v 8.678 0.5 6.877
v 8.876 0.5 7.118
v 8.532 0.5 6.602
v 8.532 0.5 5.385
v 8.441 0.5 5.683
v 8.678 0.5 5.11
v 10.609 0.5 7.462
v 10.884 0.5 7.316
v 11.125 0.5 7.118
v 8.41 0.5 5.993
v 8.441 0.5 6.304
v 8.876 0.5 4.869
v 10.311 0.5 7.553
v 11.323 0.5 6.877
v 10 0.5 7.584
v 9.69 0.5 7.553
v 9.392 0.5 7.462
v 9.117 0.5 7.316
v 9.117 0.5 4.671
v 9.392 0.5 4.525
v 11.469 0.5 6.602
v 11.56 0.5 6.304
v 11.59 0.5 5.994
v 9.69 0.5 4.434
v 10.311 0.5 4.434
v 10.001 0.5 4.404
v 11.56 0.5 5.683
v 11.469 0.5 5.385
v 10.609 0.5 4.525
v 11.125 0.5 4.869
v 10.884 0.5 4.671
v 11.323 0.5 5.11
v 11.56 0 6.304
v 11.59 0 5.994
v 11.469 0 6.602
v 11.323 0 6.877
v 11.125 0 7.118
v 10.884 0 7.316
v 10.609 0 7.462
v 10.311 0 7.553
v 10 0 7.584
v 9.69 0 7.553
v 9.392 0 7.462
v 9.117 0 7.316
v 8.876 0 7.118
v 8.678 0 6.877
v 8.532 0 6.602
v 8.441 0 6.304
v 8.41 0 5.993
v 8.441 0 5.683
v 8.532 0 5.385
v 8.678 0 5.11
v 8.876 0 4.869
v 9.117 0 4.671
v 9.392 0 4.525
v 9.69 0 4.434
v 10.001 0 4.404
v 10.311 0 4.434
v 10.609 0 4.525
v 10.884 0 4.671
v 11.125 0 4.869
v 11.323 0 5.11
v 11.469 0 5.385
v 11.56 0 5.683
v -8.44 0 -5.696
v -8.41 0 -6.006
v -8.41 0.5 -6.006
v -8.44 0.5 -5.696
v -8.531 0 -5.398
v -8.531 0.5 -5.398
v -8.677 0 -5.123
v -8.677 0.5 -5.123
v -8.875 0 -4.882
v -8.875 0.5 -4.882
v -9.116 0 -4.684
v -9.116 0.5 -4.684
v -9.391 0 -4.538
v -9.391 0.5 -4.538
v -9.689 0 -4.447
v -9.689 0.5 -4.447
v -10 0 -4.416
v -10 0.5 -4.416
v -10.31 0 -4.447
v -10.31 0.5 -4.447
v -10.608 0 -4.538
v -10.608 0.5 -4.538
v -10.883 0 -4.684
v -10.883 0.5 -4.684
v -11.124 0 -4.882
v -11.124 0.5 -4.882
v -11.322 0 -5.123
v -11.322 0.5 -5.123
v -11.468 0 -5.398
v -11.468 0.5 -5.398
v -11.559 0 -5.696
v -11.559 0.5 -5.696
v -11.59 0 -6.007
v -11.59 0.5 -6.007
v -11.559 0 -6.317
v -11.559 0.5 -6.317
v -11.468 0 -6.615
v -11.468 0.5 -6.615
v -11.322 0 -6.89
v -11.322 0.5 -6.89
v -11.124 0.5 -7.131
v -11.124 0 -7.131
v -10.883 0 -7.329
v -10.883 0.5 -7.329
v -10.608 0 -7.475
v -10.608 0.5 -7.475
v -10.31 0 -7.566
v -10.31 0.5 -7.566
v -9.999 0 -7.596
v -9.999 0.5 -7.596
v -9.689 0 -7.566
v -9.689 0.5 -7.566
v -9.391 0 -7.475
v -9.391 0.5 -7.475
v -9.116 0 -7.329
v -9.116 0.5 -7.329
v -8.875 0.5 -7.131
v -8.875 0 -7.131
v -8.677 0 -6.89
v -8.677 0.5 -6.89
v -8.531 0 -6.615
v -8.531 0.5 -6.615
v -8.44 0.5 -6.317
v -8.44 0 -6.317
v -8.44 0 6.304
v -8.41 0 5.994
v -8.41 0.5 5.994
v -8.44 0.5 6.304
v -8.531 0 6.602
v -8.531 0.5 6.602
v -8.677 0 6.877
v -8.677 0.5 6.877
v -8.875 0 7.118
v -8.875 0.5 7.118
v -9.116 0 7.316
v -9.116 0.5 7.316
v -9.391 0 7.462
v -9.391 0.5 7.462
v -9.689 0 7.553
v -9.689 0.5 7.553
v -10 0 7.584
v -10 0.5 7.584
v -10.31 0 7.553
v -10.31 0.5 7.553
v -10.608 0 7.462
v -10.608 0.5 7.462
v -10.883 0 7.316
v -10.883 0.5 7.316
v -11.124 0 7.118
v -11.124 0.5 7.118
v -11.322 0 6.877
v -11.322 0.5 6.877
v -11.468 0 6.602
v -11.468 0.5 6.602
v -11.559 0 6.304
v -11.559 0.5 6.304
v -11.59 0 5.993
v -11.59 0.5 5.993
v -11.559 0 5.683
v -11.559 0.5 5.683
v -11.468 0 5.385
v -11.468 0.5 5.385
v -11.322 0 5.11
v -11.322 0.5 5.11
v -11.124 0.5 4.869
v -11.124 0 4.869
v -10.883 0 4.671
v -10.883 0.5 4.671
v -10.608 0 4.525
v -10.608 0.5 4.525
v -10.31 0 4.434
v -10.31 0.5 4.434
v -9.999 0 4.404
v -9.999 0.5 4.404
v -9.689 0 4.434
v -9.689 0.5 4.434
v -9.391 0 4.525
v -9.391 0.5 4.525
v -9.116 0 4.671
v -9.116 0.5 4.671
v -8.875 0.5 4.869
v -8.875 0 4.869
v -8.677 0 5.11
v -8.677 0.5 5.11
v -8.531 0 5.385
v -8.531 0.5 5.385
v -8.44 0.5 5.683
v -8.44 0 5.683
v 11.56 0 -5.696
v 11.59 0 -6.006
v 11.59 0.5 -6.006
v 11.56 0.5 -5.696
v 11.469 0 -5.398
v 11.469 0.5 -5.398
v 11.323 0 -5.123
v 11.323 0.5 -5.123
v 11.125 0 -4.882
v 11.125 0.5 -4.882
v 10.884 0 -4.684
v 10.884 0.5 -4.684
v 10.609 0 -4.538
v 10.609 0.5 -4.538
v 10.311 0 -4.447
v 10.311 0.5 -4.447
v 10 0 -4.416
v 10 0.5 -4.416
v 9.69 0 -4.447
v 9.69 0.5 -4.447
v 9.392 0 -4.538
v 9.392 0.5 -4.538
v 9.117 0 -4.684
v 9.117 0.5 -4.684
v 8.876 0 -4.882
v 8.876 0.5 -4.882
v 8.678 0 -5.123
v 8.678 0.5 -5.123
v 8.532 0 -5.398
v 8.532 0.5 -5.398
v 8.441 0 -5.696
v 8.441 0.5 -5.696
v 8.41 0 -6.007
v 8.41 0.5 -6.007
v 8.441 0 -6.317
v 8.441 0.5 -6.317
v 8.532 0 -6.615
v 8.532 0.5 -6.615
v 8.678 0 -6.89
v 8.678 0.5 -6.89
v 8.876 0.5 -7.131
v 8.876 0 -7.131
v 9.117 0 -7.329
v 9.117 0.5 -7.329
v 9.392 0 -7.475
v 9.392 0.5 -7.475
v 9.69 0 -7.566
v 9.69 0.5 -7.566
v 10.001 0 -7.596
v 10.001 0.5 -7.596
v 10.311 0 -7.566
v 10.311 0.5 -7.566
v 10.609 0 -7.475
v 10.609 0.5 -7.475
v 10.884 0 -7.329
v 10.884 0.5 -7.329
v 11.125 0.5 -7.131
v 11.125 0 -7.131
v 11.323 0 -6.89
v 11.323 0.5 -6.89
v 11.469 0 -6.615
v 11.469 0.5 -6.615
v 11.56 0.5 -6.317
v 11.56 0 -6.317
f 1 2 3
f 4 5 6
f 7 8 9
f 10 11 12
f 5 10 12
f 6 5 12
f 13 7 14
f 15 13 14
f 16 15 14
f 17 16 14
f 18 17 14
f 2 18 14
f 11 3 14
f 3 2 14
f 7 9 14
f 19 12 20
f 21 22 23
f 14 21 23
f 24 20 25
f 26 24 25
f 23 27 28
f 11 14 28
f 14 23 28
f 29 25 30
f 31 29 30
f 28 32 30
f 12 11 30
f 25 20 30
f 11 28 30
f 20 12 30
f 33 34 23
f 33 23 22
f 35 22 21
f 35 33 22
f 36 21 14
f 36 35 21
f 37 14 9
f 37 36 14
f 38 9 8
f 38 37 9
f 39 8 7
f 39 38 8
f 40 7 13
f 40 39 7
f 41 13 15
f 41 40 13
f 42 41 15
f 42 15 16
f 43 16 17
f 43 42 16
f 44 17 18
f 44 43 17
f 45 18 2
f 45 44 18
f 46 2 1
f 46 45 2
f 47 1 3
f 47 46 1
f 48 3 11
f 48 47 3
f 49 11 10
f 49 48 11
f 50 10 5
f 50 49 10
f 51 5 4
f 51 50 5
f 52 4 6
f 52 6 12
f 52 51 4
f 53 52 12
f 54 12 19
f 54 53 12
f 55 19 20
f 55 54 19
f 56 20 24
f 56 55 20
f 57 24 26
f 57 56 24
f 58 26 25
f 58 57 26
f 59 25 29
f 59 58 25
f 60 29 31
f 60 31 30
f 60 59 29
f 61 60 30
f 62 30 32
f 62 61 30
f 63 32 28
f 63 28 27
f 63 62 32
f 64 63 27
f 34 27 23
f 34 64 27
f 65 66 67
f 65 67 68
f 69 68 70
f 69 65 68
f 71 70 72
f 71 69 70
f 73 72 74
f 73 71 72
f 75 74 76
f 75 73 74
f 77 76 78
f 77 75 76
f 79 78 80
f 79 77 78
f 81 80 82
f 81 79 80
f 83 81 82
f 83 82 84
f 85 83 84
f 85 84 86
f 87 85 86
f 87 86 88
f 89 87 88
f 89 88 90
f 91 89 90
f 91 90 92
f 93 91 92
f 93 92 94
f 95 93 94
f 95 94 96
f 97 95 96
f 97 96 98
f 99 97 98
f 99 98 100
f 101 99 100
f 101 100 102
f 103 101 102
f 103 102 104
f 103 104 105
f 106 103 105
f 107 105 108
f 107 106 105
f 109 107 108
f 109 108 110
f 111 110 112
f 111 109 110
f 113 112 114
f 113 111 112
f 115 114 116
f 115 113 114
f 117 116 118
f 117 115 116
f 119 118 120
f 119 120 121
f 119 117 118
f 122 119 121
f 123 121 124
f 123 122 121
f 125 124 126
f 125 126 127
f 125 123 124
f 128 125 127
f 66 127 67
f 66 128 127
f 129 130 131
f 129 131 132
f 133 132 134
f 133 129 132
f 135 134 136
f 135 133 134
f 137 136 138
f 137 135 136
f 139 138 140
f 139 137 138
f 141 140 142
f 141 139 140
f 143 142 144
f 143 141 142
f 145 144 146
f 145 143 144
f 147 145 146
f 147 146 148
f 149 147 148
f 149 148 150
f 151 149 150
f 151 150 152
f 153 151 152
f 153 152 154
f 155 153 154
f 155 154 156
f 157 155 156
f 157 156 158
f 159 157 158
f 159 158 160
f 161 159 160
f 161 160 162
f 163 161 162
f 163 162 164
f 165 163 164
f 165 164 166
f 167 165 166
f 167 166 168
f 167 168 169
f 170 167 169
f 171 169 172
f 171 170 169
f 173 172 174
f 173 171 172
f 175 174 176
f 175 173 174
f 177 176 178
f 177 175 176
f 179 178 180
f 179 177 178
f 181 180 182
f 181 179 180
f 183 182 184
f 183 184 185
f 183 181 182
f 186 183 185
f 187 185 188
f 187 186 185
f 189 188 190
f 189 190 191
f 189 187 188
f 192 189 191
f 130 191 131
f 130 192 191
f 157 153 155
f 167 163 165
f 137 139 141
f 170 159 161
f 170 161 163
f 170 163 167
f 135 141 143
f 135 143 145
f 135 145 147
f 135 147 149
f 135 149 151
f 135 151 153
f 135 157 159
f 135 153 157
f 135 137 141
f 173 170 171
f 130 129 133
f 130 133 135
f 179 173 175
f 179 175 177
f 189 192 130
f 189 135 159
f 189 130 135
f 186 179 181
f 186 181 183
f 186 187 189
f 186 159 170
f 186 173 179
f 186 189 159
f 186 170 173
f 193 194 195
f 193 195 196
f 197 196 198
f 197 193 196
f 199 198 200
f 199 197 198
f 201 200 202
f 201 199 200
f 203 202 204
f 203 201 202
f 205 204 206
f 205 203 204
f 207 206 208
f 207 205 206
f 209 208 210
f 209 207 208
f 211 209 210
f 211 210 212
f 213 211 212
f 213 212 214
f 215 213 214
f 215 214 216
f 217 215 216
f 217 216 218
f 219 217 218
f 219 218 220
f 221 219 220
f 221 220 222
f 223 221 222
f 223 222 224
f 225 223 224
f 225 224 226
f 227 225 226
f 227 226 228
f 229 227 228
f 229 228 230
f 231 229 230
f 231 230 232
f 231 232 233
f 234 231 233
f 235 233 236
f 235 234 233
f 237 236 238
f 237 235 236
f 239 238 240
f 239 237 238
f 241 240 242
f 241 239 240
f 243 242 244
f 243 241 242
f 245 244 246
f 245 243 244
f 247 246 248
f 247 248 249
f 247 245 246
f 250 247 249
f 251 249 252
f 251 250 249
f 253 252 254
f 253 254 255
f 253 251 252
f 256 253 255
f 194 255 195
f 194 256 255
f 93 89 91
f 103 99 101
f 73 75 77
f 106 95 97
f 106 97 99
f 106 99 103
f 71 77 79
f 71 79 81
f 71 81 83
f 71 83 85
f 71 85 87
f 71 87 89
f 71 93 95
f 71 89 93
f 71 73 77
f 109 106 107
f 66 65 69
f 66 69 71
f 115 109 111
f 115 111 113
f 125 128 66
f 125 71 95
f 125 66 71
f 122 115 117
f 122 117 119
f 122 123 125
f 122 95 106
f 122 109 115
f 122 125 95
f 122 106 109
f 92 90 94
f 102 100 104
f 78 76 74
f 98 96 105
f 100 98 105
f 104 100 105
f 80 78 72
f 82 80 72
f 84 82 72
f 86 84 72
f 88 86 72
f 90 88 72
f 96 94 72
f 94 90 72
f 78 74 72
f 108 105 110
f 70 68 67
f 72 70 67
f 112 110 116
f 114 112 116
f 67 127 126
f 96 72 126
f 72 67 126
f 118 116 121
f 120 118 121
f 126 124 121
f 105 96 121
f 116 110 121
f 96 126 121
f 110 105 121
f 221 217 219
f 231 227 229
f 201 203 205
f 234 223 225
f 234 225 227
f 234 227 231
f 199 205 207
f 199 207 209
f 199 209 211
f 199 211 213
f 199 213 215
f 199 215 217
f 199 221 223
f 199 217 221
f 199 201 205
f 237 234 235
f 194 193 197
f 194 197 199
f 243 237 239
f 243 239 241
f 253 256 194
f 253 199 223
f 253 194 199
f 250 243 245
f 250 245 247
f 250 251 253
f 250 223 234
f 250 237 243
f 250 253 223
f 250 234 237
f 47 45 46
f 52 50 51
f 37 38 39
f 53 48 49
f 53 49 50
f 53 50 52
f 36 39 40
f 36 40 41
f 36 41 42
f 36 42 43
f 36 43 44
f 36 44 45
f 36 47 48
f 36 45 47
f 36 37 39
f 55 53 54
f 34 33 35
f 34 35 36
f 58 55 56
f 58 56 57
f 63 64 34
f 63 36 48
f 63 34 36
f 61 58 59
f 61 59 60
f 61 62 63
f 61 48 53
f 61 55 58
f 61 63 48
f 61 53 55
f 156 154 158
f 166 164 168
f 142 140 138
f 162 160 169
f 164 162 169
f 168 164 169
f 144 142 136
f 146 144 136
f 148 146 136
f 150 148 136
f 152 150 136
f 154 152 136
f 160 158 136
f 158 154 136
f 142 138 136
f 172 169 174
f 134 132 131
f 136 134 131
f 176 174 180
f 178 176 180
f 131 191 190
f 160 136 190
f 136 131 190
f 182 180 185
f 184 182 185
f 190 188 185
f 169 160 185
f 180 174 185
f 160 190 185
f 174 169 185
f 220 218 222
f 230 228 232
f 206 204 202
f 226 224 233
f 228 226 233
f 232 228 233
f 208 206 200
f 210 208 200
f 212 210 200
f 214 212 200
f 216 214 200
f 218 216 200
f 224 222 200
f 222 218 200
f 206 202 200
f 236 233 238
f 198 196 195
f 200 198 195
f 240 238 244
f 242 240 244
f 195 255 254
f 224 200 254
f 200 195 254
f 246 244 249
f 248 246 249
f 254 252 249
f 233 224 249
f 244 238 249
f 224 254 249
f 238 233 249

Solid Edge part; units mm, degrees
sketch "Sketch1" plane through (0, 0, 0) normal (0, -1, 0) x (1, 0, 0)
  circle A0 centre (-9.9995, 5.9935) radius 1.59
  circle A1 centre (10.0005, 5.9935) radius 1.59
  circle A2 centre (10.0005, -6.0065) radius 1.59
  circle A3 centre (-9.9995, -6.0065) radius 1.59
  dimension "D1" = 10
  dimension "D2" = 10
  dimension "D3" = 10
  dimension "D4" = 6
  dimension "D5" = 6
  dimension "D6" = 6
  dimension "D7" = 10
  dimension "D8" = 6
extrude "Protrusion1" add sketch "Sketch1" against normal blind 0.5
